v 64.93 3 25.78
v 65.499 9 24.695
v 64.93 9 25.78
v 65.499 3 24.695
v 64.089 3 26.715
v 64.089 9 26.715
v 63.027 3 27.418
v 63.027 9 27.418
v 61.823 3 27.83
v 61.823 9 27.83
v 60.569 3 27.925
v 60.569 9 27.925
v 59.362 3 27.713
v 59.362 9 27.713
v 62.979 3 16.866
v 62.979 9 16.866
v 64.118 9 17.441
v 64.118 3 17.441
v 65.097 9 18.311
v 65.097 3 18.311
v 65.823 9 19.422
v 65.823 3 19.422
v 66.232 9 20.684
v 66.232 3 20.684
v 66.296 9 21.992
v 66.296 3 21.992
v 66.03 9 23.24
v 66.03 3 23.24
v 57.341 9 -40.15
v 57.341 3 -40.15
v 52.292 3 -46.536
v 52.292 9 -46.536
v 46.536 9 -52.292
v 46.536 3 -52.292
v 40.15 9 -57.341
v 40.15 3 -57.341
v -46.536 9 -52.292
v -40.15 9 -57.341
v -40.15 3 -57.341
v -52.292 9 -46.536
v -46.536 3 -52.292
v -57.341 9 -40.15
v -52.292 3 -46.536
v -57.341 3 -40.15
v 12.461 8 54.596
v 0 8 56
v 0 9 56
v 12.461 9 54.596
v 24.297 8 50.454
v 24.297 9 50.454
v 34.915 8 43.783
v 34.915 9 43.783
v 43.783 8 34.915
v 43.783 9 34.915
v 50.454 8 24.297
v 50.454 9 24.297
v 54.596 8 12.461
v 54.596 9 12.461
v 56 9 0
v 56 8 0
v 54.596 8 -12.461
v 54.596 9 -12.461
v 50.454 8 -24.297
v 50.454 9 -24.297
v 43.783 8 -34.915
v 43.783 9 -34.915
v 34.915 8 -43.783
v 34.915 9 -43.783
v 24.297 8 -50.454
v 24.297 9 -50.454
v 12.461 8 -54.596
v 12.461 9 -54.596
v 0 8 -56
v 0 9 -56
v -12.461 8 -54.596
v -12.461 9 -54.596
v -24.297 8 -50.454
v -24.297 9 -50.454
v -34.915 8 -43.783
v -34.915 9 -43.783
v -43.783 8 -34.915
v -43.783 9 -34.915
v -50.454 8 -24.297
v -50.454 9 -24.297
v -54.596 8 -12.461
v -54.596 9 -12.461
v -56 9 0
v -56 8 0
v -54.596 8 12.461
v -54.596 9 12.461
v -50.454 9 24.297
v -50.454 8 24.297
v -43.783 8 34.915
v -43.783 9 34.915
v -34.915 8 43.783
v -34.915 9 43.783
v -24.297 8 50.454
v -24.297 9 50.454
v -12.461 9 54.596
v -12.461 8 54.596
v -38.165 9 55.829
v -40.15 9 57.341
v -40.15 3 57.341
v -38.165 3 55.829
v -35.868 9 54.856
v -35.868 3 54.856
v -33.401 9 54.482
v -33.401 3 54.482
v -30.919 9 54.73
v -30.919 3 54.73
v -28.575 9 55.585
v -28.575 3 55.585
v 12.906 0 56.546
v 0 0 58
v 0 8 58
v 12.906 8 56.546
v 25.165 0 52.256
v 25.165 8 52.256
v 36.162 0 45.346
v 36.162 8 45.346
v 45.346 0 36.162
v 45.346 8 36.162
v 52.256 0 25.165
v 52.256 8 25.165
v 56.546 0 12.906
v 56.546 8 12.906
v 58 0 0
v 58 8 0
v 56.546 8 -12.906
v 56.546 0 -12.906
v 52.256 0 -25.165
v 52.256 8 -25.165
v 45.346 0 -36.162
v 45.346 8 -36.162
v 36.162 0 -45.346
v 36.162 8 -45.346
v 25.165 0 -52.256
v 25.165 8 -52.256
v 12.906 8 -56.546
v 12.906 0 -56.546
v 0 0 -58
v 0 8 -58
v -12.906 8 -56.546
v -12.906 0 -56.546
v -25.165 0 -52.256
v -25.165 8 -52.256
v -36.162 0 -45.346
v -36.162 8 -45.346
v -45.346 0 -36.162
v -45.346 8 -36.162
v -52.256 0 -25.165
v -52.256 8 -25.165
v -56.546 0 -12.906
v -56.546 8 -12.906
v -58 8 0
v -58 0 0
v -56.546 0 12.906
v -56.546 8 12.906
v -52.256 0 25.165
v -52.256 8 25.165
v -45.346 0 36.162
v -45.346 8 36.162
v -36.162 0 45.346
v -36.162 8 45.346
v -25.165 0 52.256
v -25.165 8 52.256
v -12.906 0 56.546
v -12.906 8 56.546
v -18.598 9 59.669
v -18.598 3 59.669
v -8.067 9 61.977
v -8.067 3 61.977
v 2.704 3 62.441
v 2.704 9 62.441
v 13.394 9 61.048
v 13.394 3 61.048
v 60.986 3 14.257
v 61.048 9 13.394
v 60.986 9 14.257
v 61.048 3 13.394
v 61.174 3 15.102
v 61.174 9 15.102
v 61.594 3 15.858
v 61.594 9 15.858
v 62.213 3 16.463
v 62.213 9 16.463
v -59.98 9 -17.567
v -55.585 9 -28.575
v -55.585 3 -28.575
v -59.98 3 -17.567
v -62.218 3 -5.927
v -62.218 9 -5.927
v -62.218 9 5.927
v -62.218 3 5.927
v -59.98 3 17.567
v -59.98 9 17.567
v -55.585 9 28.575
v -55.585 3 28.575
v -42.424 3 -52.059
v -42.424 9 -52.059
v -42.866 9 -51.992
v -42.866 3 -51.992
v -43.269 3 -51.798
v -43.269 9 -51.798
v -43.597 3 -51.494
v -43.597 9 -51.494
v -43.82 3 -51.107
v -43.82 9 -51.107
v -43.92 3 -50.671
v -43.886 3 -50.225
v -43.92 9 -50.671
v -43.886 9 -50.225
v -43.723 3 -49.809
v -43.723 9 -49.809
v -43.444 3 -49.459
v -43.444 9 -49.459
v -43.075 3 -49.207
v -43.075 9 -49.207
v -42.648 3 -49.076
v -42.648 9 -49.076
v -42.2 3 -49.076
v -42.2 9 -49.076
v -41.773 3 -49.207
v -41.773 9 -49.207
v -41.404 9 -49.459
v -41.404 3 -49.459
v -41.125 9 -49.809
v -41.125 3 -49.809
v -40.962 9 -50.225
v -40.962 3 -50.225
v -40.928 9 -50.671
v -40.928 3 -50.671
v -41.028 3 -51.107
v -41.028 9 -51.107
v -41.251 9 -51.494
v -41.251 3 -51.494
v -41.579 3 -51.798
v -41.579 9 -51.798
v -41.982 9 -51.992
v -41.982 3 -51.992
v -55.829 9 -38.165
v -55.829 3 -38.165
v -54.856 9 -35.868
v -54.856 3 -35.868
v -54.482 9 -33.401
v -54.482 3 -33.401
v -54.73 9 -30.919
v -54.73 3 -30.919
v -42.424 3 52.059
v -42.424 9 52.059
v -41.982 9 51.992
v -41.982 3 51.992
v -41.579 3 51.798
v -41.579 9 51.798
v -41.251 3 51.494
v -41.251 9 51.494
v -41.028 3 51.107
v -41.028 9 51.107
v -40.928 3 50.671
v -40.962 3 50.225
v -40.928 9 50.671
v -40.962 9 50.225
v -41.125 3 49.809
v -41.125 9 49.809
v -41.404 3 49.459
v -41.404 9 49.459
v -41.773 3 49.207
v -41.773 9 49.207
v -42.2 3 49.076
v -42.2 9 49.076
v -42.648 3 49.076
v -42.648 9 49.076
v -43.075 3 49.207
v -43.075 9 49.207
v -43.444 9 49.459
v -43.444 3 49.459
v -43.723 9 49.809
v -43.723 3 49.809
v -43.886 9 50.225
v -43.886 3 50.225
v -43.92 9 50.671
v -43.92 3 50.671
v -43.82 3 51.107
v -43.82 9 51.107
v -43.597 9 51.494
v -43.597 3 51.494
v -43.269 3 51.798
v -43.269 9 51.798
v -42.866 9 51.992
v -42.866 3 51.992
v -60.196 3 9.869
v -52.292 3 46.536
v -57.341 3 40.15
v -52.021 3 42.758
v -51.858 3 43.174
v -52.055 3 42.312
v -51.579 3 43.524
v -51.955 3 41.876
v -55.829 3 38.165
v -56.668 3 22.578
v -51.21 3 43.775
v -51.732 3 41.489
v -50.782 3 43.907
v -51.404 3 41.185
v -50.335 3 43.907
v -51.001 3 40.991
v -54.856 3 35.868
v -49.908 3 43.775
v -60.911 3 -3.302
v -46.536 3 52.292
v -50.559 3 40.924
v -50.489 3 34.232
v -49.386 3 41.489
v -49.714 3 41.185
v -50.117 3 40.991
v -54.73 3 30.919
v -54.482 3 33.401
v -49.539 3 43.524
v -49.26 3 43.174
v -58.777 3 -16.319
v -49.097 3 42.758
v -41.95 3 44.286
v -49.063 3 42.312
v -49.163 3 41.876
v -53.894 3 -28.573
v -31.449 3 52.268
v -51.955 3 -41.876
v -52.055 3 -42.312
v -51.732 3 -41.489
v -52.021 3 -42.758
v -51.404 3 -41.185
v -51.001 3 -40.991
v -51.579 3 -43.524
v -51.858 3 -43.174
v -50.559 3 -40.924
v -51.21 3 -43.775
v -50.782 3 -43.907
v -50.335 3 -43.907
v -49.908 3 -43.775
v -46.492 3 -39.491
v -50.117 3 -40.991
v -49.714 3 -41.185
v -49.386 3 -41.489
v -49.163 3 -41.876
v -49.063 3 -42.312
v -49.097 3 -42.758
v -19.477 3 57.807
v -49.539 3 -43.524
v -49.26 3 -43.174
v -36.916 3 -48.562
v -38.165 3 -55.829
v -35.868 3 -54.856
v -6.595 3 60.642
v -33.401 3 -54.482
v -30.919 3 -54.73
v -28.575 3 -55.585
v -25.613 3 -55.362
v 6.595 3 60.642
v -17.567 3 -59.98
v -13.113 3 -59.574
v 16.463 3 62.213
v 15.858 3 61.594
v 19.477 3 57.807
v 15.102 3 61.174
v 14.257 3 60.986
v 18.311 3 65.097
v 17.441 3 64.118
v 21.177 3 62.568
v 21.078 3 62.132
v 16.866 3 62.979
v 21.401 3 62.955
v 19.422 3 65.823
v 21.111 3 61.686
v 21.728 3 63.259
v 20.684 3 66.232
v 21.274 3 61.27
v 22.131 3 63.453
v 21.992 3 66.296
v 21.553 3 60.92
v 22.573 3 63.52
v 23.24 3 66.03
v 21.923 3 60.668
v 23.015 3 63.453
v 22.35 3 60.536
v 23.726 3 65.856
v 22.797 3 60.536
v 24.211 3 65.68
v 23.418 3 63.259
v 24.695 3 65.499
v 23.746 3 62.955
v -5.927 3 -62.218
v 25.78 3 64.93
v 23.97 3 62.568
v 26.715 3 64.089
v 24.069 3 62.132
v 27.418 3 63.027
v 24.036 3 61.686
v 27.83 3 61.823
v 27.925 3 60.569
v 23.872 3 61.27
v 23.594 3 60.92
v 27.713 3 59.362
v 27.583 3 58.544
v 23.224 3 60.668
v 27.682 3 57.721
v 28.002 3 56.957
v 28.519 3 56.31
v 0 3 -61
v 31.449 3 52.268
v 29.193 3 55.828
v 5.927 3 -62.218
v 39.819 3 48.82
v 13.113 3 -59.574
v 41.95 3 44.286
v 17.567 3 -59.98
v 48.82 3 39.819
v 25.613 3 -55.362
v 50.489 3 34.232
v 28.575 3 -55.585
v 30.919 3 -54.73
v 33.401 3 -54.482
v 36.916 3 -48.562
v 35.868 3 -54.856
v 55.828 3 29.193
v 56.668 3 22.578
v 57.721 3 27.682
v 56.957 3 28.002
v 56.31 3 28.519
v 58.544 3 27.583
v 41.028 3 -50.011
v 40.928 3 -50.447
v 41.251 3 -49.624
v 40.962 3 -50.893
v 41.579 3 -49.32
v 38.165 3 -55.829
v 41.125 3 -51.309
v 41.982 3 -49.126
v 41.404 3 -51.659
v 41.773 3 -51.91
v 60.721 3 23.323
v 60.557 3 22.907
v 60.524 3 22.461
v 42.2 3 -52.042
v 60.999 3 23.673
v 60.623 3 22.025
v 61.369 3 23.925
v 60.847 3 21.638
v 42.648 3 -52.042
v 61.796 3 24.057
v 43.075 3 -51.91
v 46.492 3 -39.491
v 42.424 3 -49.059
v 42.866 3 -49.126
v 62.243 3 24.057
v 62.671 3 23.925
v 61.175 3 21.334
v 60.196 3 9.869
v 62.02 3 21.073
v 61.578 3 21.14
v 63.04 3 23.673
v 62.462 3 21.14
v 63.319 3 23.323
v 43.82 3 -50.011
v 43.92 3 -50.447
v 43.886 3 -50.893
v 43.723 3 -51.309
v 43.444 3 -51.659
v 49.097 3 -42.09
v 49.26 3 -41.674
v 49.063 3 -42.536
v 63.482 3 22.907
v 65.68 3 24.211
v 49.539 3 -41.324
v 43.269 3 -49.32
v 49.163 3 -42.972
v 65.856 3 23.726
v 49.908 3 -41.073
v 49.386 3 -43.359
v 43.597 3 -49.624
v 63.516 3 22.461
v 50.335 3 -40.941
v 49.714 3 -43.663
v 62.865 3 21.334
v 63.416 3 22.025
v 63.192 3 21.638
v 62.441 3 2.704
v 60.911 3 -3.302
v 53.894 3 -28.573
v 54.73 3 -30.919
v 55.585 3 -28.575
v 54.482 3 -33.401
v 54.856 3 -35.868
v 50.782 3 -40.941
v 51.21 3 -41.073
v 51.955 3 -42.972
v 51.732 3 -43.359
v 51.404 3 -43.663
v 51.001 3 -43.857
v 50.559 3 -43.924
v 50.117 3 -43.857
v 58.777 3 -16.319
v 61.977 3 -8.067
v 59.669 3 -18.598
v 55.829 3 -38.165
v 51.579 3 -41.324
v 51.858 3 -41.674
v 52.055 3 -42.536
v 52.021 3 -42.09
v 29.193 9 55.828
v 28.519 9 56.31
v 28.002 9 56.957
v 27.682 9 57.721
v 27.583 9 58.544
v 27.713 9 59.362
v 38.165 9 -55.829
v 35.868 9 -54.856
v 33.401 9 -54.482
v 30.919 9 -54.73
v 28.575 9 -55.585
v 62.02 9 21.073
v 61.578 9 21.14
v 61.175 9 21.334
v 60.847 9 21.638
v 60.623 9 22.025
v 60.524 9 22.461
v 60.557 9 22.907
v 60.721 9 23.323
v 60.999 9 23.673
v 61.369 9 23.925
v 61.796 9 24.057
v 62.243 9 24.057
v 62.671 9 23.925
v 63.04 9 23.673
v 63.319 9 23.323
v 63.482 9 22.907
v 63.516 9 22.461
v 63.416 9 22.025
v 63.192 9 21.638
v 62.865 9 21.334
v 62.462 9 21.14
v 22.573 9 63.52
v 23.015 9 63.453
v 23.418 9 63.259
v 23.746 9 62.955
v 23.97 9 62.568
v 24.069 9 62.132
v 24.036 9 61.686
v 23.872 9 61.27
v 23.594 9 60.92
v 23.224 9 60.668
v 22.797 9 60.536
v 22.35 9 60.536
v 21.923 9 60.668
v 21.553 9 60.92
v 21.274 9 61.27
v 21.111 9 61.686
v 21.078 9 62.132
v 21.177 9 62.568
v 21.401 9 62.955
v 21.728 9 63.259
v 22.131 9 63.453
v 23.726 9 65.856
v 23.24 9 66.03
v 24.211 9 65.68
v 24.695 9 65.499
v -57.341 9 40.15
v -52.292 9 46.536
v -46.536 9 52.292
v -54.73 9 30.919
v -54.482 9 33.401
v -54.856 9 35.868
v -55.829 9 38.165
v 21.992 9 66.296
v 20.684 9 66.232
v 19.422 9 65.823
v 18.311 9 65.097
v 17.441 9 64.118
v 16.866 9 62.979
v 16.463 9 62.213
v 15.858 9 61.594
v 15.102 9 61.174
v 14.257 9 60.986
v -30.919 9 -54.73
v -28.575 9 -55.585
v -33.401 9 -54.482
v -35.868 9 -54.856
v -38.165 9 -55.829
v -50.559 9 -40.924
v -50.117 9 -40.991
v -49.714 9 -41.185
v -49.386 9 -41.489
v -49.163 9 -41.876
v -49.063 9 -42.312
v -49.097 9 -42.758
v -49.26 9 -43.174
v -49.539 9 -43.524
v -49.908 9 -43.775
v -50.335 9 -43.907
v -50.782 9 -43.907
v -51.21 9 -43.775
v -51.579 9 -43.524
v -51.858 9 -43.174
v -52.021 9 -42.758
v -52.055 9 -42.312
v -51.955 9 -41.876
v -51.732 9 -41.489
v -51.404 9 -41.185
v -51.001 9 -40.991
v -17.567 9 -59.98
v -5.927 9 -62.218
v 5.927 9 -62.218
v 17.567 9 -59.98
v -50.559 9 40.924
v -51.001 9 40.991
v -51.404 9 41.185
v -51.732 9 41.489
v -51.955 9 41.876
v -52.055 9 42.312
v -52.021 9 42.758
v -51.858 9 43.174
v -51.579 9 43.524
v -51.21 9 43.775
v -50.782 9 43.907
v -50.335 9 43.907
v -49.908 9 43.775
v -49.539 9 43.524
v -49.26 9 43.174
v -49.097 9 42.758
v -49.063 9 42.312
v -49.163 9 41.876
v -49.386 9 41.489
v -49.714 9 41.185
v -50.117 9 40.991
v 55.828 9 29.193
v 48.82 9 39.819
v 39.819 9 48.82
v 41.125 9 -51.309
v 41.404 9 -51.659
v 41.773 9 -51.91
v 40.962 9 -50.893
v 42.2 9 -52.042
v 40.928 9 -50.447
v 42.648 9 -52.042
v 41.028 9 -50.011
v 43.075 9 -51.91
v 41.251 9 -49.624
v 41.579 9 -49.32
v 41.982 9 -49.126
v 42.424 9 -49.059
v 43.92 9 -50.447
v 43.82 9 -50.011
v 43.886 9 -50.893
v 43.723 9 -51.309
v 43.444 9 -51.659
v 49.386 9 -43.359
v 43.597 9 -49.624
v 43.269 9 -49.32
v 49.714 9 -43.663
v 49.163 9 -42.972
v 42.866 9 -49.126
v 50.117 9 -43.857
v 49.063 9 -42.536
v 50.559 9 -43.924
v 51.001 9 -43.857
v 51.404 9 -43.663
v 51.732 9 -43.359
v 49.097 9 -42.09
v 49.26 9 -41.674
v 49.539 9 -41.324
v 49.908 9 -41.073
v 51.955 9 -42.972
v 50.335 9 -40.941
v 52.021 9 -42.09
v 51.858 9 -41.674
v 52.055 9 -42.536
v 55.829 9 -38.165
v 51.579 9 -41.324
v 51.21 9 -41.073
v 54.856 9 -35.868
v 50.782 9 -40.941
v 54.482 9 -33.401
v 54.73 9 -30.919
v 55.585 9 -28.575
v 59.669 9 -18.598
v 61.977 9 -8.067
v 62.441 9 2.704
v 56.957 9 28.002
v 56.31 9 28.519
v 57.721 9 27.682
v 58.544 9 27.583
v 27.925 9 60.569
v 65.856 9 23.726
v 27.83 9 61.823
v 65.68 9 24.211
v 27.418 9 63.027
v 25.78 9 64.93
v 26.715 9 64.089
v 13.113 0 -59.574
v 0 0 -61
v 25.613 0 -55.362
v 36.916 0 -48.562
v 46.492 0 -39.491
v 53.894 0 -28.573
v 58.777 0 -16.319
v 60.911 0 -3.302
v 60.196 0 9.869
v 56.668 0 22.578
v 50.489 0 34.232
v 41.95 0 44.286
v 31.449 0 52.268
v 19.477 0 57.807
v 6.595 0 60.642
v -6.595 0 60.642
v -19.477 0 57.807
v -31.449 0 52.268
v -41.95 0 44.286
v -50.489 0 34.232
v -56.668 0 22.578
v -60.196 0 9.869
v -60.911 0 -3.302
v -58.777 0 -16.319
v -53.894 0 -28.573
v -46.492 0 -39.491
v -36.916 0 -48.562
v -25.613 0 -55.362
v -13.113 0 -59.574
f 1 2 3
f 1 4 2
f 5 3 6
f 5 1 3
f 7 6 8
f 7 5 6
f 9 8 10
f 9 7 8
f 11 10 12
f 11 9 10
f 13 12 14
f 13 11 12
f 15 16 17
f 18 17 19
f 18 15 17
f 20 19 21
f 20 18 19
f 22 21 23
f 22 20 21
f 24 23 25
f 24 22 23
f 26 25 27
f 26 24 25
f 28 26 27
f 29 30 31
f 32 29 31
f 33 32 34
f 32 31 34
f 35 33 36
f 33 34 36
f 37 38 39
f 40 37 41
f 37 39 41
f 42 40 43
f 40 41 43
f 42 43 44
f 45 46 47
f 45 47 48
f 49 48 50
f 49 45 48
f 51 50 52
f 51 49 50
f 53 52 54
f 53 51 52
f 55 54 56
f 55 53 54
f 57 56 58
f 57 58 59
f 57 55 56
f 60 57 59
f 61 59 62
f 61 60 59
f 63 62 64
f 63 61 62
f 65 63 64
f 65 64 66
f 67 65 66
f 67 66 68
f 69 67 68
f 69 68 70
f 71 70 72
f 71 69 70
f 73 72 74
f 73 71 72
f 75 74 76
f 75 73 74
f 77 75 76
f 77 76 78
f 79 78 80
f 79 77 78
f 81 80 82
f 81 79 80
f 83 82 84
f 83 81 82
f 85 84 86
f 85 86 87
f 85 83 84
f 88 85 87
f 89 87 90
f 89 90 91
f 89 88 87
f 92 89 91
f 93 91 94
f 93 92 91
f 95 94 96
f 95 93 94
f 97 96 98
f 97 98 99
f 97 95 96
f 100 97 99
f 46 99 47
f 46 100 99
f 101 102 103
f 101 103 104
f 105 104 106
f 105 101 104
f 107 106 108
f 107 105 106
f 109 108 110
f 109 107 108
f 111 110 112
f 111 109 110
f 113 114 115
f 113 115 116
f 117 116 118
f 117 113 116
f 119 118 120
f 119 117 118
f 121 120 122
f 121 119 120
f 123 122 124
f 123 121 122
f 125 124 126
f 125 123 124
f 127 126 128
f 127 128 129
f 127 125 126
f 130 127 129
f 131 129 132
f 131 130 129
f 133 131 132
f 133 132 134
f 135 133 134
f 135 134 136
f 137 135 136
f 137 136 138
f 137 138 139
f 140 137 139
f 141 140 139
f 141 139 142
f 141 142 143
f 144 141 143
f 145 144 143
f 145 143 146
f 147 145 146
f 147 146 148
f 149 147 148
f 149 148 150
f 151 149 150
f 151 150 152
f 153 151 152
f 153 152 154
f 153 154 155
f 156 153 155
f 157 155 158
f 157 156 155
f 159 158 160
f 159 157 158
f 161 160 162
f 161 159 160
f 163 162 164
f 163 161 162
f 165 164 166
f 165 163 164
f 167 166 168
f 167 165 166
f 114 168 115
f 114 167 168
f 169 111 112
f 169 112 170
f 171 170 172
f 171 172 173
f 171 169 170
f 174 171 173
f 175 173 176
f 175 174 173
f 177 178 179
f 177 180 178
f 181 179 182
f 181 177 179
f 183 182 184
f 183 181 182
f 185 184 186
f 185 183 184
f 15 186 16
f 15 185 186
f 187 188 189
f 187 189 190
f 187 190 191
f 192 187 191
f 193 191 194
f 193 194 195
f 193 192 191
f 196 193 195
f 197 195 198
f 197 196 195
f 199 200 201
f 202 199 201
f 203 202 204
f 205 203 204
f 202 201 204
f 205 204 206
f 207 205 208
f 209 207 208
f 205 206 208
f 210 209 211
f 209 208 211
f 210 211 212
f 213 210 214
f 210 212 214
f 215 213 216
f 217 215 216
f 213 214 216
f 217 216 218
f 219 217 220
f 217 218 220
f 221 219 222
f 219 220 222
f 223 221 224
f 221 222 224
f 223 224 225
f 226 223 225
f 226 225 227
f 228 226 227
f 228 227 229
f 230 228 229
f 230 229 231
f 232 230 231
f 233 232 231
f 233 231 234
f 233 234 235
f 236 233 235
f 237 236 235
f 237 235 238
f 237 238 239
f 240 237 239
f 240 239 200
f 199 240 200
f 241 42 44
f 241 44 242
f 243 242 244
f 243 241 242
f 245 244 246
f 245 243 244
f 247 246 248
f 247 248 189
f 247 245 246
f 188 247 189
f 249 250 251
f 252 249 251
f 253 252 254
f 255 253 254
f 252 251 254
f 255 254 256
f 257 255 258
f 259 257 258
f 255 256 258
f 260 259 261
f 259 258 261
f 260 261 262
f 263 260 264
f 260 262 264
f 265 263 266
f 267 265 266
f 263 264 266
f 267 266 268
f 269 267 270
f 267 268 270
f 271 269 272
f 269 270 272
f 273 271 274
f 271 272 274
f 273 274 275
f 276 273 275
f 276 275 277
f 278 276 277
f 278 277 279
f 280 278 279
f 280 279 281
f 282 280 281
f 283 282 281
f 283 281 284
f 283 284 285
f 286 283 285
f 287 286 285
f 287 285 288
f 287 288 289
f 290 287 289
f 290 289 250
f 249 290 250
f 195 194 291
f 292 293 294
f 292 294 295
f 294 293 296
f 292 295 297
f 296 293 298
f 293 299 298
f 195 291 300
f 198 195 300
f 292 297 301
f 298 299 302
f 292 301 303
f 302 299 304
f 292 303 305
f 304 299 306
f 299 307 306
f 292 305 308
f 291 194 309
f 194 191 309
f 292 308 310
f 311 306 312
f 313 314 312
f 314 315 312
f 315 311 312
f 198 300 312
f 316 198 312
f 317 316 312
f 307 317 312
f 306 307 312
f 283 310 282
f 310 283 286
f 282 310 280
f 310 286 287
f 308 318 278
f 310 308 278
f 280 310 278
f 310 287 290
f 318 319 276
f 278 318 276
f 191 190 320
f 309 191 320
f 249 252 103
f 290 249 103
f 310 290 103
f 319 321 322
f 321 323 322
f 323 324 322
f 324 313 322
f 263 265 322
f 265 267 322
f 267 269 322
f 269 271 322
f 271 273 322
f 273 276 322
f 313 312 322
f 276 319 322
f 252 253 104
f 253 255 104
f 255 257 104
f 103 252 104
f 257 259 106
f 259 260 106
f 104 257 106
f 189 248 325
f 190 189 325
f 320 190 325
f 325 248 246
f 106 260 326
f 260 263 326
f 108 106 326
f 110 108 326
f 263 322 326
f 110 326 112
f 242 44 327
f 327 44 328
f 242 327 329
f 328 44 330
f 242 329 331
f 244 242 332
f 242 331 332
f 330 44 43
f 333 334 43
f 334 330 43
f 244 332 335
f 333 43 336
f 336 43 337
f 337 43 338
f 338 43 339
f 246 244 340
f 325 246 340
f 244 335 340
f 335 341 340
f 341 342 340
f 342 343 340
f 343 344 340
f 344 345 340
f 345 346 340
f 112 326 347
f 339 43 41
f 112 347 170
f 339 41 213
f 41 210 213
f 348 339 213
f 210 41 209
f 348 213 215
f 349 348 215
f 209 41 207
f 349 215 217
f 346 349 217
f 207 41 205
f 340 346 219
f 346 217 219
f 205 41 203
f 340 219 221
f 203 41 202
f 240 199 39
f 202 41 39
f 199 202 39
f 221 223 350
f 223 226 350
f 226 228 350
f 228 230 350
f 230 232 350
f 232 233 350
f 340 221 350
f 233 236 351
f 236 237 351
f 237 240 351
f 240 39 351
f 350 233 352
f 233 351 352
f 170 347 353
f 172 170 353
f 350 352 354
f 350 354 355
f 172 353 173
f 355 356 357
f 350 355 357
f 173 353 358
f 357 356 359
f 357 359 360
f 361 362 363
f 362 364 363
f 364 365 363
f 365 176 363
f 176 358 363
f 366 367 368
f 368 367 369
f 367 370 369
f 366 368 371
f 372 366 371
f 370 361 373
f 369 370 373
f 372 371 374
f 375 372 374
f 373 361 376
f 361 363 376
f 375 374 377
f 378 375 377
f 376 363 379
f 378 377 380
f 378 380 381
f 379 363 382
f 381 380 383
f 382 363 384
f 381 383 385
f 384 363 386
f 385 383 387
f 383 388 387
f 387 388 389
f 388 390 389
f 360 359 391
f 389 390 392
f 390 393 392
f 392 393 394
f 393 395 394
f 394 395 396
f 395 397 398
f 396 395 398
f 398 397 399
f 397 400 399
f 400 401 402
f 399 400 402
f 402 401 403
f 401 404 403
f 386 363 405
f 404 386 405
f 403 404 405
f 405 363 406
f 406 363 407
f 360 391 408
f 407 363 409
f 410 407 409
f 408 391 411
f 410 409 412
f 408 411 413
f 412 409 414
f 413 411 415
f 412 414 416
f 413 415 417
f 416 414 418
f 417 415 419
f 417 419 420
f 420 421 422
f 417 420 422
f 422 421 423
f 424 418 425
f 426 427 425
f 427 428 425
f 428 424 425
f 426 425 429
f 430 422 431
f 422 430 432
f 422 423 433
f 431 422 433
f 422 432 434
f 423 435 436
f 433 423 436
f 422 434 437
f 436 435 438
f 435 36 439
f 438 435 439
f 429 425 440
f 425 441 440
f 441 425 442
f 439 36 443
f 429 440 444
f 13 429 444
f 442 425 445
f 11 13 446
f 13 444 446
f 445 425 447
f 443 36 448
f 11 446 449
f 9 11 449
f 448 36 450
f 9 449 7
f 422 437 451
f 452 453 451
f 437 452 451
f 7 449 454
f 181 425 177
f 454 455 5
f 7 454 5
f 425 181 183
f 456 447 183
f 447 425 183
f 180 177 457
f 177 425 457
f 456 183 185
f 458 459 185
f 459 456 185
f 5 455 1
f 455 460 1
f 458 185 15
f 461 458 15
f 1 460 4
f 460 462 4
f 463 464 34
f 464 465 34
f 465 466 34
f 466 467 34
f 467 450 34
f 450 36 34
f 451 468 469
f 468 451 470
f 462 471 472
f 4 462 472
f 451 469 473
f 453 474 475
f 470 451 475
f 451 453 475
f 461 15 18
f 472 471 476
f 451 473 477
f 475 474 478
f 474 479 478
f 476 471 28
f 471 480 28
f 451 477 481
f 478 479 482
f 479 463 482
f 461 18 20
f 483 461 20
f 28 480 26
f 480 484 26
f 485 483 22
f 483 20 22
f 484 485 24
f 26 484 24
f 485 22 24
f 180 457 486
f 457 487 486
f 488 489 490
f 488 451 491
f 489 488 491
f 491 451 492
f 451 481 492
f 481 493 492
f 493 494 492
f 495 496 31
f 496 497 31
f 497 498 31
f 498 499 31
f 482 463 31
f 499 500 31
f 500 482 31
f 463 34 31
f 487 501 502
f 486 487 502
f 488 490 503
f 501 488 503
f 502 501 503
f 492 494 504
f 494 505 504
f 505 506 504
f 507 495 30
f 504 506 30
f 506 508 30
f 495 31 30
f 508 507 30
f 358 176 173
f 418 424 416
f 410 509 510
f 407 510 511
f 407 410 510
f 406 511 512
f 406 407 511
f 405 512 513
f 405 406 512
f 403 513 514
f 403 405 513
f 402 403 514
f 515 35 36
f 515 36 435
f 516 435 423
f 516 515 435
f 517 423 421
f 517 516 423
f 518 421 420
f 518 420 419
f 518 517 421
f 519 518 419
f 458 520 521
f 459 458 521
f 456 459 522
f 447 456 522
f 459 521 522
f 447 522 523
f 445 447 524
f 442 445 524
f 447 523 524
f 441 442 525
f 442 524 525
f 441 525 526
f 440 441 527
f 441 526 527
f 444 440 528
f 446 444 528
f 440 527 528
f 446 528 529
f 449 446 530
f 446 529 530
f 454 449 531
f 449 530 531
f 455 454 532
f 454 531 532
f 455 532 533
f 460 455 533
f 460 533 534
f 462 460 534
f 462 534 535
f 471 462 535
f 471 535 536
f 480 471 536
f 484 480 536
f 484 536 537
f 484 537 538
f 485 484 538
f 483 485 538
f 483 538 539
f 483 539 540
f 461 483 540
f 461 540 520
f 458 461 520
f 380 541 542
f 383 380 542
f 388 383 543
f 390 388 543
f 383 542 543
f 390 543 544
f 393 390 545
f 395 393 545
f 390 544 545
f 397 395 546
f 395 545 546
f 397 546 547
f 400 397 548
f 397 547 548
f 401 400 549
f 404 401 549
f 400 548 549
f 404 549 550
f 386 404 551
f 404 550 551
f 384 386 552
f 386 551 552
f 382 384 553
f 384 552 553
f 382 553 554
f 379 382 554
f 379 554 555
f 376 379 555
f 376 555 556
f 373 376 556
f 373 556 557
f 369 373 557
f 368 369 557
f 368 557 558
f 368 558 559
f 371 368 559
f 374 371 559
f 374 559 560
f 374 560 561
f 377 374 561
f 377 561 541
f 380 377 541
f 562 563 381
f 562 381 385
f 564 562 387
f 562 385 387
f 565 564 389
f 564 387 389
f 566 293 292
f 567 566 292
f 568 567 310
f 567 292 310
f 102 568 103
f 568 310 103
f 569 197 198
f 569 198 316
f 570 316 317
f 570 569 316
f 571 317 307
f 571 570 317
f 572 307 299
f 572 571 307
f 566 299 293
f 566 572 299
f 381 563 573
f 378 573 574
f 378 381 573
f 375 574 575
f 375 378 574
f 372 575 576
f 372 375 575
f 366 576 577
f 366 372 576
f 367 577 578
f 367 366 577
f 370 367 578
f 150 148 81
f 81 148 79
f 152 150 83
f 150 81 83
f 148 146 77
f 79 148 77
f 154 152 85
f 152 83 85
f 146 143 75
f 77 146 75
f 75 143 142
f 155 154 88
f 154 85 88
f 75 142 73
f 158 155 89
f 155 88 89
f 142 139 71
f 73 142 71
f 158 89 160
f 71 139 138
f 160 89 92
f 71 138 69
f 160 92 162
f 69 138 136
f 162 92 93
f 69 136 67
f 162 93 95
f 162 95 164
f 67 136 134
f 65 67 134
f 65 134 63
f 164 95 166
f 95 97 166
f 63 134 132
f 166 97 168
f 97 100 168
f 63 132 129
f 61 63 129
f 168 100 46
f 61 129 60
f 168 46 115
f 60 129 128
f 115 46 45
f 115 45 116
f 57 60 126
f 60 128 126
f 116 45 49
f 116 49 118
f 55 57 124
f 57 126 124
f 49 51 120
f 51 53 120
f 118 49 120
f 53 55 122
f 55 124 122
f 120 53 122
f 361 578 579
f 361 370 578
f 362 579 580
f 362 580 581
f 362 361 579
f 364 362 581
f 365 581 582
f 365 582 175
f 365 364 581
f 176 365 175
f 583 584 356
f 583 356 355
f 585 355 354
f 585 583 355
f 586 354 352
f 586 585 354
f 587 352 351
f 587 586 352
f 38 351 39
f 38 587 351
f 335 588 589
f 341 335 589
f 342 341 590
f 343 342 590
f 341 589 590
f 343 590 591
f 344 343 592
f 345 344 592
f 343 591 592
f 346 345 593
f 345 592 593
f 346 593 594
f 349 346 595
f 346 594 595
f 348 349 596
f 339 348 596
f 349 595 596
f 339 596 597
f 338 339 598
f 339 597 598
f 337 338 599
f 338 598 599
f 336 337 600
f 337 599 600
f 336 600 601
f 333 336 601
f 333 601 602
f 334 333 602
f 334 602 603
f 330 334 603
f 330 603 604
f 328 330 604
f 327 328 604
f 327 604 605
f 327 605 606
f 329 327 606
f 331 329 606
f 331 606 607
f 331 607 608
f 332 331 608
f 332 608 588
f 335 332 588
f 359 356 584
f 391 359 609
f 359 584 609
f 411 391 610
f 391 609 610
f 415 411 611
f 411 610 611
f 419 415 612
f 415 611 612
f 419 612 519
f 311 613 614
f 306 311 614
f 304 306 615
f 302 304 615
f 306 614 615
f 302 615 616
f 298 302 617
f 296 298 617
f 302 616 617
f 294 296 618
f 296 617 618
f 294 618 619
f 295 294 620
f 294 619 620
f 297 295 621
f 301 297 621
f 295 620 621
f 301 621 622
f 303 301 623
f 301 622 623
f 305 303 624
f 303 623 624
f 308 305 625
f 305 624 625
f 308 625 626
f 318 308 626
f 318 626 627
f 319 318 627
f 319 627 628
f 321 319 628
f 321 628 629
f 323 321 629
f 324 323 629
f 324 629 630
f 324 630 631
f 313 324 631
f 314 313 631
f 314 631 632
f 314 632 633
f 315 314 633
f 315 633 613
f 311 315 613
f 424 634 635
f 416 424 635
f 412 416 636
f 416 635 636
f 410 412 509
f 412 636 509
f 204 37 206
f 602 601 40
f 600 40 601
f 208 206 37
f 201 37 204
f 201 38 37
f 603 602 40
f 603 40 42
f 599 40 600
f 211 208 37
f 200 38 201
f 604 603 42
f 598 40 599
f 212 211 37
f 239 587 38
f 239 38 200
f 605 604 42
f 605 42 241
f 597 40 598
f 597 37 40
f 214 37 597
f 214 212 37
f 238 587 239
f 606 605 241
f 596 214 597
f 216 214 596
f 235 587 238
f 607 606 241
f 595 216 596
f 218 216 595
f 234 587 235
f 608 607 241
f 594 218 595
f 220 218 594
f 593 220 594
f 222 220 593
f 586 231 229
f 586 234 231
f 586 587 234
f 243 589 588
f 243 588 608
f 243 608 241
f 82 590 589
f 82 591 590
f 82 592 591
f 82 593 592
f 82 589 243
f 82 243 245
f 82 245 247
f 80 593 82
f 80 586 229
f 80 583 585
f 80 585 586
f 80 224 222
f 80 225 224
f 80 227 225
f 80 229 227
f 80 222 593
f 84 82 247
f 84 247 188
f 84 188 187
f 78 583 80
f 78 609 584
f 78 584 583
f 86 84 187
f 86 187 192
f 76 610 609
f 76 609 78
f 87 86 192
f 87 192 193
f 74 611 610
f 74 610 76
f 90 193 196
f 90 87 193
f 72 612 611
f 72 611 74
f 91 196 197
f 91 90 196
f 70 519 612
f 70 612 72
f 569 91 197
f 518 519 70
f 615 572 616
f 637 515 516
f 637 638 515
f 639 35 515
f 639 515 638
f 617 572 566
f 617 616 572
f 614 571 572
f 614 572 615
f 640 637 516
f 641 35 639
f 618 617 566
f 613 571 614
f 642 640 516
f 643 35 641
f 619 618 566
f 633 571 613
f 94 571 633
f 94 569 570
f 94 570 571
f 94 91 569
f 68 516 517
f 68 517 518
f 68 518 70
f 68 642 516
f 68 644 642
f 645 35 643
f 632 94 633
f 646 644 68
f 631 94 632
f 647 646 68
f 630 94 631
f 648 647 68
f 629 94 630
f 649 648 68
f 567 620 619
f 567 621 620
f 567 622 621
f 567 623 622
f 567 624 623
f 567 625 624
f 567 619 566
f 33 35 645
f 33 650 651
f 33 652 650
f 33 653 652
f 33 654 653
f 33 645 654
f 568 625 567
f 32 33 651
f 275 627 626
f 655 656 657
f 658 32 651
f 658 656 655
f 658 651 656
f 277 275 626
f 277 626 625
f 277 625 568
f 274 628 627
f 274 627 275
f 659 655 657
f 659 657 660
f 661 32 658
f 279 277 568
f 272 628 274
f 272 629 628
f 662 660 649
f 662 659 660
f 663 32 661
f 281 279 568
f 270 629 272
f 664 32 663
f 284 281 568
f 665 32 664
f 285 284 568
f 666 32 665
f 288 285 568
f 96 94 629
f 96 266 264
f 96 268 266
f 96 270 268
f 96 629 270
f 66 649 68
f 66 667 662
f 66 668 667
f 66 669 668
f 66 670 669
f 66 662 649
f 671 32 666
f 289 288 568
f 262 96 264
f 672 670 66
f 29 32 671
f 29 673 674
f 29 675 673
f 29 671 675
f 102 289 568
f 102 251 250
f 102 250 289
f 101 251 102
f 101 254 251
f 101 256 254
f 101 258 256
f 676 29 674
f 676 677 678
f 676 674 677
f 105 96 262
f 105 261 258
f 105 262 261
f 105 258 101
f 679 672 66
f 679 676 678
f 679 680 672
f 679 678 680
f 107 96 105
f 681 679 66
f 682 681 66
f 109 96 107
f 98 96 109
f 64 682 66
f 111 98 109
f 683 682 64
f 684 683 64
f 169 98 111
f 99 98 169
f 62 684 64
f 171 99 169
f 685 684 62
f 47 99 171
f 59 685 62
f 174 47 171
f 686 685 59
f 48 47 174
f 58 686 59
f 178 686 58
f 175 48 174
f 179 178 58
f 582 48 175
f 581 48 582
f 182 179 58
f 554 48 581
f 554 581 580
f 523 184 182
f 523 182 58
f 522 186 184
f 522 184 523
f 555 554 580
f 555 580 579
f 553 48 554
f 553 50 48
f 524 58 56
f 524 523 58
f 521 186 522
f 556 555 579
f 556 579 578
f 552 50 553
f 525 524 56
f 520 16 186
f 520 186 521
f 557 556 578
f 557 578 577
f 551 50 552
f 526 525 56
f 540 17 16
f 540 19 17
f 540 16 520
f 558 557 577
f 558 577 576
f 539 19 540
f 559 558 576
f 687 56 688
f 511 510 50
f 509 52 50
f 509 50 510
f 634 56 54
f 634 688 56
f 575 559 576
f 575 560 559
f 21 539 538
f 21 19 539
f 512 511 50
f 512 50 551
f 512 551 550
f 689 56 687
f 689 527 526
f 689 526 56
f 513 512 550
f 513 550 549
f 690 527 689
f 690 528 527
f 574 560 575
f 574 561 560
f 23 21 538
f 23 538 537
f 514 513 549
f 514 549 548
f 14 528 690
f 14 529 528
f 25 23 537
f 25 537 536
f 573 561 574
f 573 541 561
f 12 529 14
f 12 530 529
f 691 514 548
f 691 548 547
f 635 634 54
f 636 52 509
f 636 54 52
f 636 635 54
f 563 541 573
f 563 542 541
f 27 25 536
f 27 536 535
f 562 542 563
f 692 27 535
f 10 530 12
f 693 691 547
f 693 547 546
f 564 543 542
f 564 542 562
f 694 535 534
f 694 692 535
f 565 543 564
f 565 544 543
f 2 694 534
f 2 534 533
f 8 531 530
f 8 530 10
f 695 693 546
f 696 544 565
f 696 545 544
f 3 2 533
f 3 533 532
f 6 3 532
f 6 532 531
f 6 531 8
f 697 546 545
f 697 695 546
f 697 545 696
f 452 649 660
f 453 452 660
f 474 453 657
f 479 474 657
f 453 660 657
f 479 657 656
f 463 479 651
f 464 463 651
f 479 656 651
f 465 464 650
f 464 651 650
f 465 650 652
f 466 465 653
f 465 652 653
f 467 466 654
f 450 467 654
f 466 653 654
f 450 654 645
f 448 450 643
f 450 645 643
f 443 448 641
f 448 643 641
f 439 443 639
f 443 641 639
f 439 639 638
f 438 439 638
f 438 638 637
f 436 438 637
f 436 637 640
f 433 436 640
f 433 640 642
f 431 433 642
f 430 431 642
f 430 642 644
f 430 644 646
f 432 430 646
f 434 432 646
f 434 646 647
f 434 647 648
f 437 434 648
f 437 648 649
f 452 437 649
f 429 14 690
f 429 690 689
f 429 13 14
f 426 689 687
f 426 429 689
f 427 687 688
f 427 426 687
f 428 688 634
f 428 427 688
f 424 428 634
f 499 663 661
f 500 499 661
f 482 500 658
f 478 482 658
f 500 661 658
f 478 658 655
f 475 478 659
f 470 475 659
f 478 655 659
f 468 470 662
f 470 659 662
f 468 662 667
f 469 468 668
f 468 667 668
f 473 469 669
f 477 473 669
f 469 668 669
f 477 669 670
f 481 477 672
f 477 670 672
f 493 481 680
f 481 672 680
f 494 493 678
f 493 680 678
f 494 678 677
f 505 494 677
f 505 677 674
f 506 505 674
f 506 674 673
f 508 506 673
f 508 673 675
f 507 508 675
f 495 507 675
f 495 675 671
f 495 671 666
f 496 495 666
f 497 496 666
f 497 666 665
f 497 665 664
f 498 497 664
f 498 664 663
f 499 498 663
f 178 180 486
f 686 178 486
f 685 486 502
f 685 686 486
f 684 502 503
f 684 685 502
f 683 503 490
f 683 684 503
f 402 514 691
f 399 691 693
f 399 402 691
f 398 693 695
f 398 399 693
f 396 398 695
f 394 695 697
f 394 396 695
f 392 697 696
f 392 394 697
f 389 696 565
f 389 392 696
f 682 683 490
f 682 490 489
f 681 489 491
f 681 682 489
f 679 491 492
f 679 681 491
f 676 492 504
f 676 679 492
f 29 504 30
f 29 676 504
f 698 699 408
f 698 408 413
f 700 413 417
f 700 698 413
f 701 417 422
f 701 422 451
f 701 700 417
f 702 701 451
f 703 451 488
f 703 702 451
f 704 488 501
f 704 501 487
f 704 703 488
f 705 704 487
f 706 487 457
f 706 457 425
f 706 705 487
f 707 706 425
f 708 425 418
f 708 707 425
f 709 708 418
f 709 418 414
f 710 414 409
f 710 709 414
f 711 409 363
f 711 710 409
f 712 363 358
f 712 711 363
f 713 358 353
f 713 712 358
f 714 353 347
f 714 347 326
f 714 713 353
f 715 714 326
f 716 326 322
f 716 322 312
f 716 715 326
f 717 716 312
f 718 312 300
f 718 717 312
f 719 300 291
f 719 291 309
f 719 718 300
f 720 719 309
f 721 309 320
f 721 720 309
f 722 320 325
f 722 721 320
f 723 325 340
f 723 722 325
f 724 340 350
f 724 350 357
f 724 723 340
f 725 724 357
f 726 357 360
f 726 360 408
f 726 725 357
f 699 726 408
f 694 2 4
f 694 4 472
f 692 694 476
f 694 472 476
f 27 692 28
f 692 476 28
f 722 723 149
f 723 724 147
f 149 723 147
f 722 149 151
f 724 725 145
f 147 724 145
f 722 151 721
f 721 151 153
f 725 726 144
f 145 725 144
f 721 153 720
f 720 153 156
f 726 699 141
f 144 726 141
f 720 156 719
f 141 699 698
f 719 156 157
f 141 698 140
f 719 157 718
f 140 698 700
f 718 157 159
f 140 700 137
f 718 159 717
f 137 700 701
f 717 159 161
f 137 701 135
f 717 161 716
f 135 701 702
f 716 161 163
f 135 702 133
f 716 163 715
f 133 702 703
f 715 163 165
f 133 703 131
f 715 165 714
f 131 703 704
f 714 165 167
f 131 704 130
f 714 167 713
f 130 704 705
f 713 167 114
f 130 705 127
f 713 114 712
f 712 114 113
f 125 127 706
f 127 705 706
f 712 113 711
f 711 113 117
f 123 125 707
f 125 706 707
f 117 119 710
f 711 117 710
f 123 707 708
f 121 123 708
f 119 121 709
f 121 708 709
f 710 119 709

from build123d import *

# Parameters (mm, degrees)
SKETCH_1_R          = 70
SKETCH_1_R_2        = 58
EXTRUDE_1_DEPTH     = 9
SKETCH_3_R          = 70
SKETCH_3_R_2        = 61
CUT_EXTRUDE_2_DEPTH = 3
CUT_EXTRUDE_3_DEPTH = 100.403219264
FILLET_1_R          = 10
CUT_EXTRUDE_6_DEPTH = 97.044388064
FILLET_7_R          = 3
SKETCH_6_R          = 1.5
CUT_EXTRUDE_4_DEPTH = 10
FILLET_9_R          = 5
EXTRUDE_START       = -1
SKETCH_9_R          = 58
SKETCH_9_R_2        = 56
EXTRUDE_2_DEPTH     = 1


with BuildPart() as part:
    # 草图1 → 凸台-拉伸1 (new body)
    with BuildSketch(Plane(origin=(0, 0, 0), x_dir=(1, 0, 0), z_dir=(0, 1, 0))):
        with Locations(Location((0, 0, 0), (0, 0, 270))):
            Circle(SKETCH_1_R)
        with Locations(Location((0, 0, 0), (0, 0, 270))):
            Circle(SKETCH_1_R_2, mode=Mode.SUBTRACT)
    extrude(amount=EXTRUDE_1_DEPTH)

    # 草图3 → 切除-拉伸2 (cut)
    with BuildSketch(Plane.XZ):
        with Locations(Location((0, 0, 0), (0, 0, 270))):
            Circle(SKETCH_3_R)
        with Locations(Location((0, 0, 0), (0, 0, 270))):
            Circle(SKETCH_3_R_2, mode=Mode.SUBTRACT)
    extrude(amount=-CUT_EXTRUDE_2_DEPTH, mode=Mode.SUBTRACT)

    # 草图4 → 切除-拉伸3 (cut, through all)
    with BuildSketch(Plane(origin=(0, 9, 0), x_dir=(1, 0, 0), z_dir=(0, 1, 0))):
        with BuildLine():
            Line((35.848527272, 51.197002768), (40.150350545, 57.3406431))
            ThreePointArc((40.150350545, 57.3406431), (0, 70), (-40.150350545, 57.3406431))
            Line((-40.150350545, 57.3406431), (-35.848527272, 51.197002768))
            ThreePointArc((-35.848527272, 51.197002768), (0, 62.5), (35.848527272, 51.197002768))
        make_face()
        with BuildLine():
            Line((51.197002768, 35.848527272), (57.3406431, 40.150350545))
            ThreePointArc((57.3406431, 40.150350545), (68.936542711, 12.155372437), (67.61480784, -18.117333157))
            Line((67.61480784, -18.117333157), (60.370364143, -16.176190319))
            ThreePointArc((60.370364143, -16.176190319), (61.550484563, 10.853011104), (51.197002768, 35.848527272))
        make_face()
        with BuildLine():
            Line((16.176190319, -60.370364143), (18.117333157, -67.61480784))
            ThreePointArc((18.117333157, -67.61480784), (-12.155372437, -68.936542711), (-40.150350545, -57.3406431))
            Line((-40.150350545, -57.3406431), (-35.848527272, -51.197002768))
            ThreePointArc((-35.848527272, -51.197002768), (-10.853011104, -61.550484563), (16.176190319, -60.370364143))
        make_face()
        with BuildLine():
            Line((-51.197002768, -35.848527272), (-57.3406431, -40.150350545))
            ThreePointArc((-57.3406431, -40.150350545), (-70, 0), (-57.3406431, 40.150350545))
            Line((-57.3406431, 40.150350545), (-51.197002768, 35.848527272))
            ThreePointArc((-51.197002768, 35.848527272), (-62.5, 0), (-51.197002768, -35.848527272))
        make_face()
    extrude(amount=-CUT_EXTRUDE_3_DEPTH, mode=Mode.SUBTRACT)

    # 圆角1
    # the kernel refuses this fillet: 10 mm, written as the material it adds along each edge
    with BuildSketch(Plane(origin=(-51.197002768, 9, 35.848527272), x_dir=(-0.8191520442890221, 0, 0.5735764363510029), z_dir=(0, -1, 0)), Plane(origin=(51.197002768, 9, -35.848527272), x_dir=(0.8191520442890228, 0, -0.5735764363510018), z_dir=(0, -1, 0)), Plane(origin=(-35.848527272, 9, -51.197002768), x_dir=(-0.5735764363510008, 0, -0.8191520442890236), z_dir=(0, -1, 0))) as fillet_1_piece_1:
        with BuildLine():
            CenterArc((9.330357143, 9.831062645), FILLET_1_R, 187.793366371, 71.660001872)
            Line((-0.577278325, 8.475054004), (-0.775431034, 8.447933831))
            ThreePointArc((-0.775431034, 8.447933831), (-0.344024235, 4.233754448), (-0.2, 0))
            Line((-0.2, 0), (0, -0.2))
            ThreePointArc((0, -0.2), (3.75, -0.2), (7.463392857, -0.196621253))
            Line((7.463392857, -0.196621253), (7.5, 0))
        make_face()
    extrude(amount=6)
    with BuildSketch(Plane(origin=(-35.848527272, 9, 51.197002768), x_dir=(-0.5735764363510476, 0, 0.8191520442889907), z_dir=(0, -1, 0))) as fillet_1_piece_2:
        with BuildLine():
            CenterArc((9.330357143, -9.831062645), FILLET_1_R, 100.546631757, 71.660001872)
            Line((-0.577278325, -8.475054004), (-0.775431034, -8.447933831))
            ThreePointArc((-0.775431034, -8.447933831), (-0.344024235, -4.233754448), (-0.2, 0))
            Line((-0.2, 0), (0, 0.2))
            ThreePointArc((0, 0.2), (3.75, 0.2), (7.463392857, 0.196621253))
            Line((7.463392857, 0.196621253), (7.5, 0))
        make_face()
    extrude(amount=6)
    with BuildSketch(Plane(origin=(35.848527272, 9, -51.197002768), x_dir=(-0.8562371813975653, 0, -0.5165828967284464), z_dir=(0, -1, 0)), Plane(origin=(-51.197002768, 9, -35.848527272), x_dir=(-0.5165828967284464, 0, 0.8562371813975653), z_dir=(0, -1, 0))) as fillet_1_piece_3:
        with BuildLine():
            CenterArc((9.174267262, 9.976882145), FILLET_1_R, 194.443314943, 71.660001872)
            Line((-0.509681515, 7.482661609), (-0.70336049, 7.432777198))
            ThreePointArc((-0.70336049, 7.432777198), (-0.4543784, 3.727739297), (-0.199537643, -0.013591507))
            Line((-0.199537643, -0.013591507), (0.013591507, -0.199537643))
            ThreePointArc((0.013591507, -0.199537643), (4.247345955, -0.055513408), (8.481100403, -0.199537643))
            Line((8.481100403, -0.199537643), (8.49469191, 0))
        make_face()
    extrude(amount=6)

    # 草图8 → 切除-拉伸6 (cut, through all)
    with BuildSketch(Plane(origin=(0, 9, 0), x_dir=(1, 0, 0), z_dir=(0, 1, 0))):
        with BuildLine():
            Line((26.62495049, -57.097390583), (29.583278322, -63.441545093))
            ThreePointArc((29.583278322, -63.441545093), (49.497474683, -49.497474683), (63.441545093, -29.583278322))
            Line((63.441545093, -29.583278322), (57.097390583, -26.62495049))
            ThreePointArc((57.097390583, -26.62495049), (44.547727215, -44.547727215), (26.62495049, -57.097390583))
        make_face()
    extrude(amount=-CUT_EXTRUDE_6_DEPTH, mode=Mode.SUBTRACT)

    # 圆角7
    fillet_7_edges = [part.edges().sort_by_distance(p)[0] for p in [
        (26.62495049, 6, 57.097390583),
        (57.097390583, 6, 26.62495049),
        (60.370364143, 6, 16.176190319),
        (16.176190319, 6, 60.370364143),
    ]]
    fillet(fillet_7_edges, radius=FILLET_7_R)

    # 草图6 → 切除-拉伸4 (cut)
    with BuildSketch(Plane(origin=(0, 9, 0), x_dir=(1, 0, 0), z_dir=(0, 1, 0))):
        with Locations(Location((42.423982239, 50.558933246, 0), (0, 0, 270))):
            Circle(SKETCH_6_R)
        with Locations(Location((-42.423982239, -50.558933246, 0), (0, 0, 270))):
            Circle(SKETCH_6_R)
        with Locations(Location((-50.558933246, 42.423982239, 0), (0, 0, 270))):
            Circle(SKETCH_6_R)
        with Locations(Location((50.558933246, 42.423982239, 0), (0, 0, 90))):
            Circle(SKETCH_6_R)
        with Locations(Location((-50.558933246, -42.423982239, 0), (0, 0, 90))):
            Circle(SKETCH_6_R)
        with Locations(Location((-42.423982239, 50.558933246, 0), (0, 0, 90))):
            Circle(SKETCH_6_R)
        with Locations(Location((22.573329459, -62.019712972, 0), (0, 0, 270))):
            Circle(SKETCH_6_R)
        with Locations(Location((62.019712972, -22.573329459, 0), (0, 0, 90))):
            Circle(SKETCH_6_R)
    extrude(amount=-CUT_EXTRUDE_4_DEPTH, mode=Mode.SUBTRACT)

    # 圆角9
    fillet_9_edges = [part.edges().sort_by_distance(p)[0] for p in [
        (67.61480784, 6, 18.117333157),
        (63.441545093, 6, 29.583278322),
        (18.117333157, 6, 67.61480784),
        (29.583278322, 6, 63.441545093),
    ]]
    fillet(fillet_9_edges, radius=FILLET_9_R)

    # 草图9 → 凸台-拉伸2 (add)
    with BuildSketch(Plane(origin=(0, 9, 0), x_dir=(1, 0, 0), z_dir=(0, 1, 0)).offset(EXTRUDE_START)):
        with Locations(Location((0, 0, 0), (0, 0, 270))):
            Circle(SKETCH_9_R)
        with Locations(Location((0, 0, 0), (0, 0, 270))):
            Circle(SKETCH_9_R_2, mode=Mode.SUBTRACT)
    extrude(amount=EXTRUDE_2_DEPTH)


solid = part.part
